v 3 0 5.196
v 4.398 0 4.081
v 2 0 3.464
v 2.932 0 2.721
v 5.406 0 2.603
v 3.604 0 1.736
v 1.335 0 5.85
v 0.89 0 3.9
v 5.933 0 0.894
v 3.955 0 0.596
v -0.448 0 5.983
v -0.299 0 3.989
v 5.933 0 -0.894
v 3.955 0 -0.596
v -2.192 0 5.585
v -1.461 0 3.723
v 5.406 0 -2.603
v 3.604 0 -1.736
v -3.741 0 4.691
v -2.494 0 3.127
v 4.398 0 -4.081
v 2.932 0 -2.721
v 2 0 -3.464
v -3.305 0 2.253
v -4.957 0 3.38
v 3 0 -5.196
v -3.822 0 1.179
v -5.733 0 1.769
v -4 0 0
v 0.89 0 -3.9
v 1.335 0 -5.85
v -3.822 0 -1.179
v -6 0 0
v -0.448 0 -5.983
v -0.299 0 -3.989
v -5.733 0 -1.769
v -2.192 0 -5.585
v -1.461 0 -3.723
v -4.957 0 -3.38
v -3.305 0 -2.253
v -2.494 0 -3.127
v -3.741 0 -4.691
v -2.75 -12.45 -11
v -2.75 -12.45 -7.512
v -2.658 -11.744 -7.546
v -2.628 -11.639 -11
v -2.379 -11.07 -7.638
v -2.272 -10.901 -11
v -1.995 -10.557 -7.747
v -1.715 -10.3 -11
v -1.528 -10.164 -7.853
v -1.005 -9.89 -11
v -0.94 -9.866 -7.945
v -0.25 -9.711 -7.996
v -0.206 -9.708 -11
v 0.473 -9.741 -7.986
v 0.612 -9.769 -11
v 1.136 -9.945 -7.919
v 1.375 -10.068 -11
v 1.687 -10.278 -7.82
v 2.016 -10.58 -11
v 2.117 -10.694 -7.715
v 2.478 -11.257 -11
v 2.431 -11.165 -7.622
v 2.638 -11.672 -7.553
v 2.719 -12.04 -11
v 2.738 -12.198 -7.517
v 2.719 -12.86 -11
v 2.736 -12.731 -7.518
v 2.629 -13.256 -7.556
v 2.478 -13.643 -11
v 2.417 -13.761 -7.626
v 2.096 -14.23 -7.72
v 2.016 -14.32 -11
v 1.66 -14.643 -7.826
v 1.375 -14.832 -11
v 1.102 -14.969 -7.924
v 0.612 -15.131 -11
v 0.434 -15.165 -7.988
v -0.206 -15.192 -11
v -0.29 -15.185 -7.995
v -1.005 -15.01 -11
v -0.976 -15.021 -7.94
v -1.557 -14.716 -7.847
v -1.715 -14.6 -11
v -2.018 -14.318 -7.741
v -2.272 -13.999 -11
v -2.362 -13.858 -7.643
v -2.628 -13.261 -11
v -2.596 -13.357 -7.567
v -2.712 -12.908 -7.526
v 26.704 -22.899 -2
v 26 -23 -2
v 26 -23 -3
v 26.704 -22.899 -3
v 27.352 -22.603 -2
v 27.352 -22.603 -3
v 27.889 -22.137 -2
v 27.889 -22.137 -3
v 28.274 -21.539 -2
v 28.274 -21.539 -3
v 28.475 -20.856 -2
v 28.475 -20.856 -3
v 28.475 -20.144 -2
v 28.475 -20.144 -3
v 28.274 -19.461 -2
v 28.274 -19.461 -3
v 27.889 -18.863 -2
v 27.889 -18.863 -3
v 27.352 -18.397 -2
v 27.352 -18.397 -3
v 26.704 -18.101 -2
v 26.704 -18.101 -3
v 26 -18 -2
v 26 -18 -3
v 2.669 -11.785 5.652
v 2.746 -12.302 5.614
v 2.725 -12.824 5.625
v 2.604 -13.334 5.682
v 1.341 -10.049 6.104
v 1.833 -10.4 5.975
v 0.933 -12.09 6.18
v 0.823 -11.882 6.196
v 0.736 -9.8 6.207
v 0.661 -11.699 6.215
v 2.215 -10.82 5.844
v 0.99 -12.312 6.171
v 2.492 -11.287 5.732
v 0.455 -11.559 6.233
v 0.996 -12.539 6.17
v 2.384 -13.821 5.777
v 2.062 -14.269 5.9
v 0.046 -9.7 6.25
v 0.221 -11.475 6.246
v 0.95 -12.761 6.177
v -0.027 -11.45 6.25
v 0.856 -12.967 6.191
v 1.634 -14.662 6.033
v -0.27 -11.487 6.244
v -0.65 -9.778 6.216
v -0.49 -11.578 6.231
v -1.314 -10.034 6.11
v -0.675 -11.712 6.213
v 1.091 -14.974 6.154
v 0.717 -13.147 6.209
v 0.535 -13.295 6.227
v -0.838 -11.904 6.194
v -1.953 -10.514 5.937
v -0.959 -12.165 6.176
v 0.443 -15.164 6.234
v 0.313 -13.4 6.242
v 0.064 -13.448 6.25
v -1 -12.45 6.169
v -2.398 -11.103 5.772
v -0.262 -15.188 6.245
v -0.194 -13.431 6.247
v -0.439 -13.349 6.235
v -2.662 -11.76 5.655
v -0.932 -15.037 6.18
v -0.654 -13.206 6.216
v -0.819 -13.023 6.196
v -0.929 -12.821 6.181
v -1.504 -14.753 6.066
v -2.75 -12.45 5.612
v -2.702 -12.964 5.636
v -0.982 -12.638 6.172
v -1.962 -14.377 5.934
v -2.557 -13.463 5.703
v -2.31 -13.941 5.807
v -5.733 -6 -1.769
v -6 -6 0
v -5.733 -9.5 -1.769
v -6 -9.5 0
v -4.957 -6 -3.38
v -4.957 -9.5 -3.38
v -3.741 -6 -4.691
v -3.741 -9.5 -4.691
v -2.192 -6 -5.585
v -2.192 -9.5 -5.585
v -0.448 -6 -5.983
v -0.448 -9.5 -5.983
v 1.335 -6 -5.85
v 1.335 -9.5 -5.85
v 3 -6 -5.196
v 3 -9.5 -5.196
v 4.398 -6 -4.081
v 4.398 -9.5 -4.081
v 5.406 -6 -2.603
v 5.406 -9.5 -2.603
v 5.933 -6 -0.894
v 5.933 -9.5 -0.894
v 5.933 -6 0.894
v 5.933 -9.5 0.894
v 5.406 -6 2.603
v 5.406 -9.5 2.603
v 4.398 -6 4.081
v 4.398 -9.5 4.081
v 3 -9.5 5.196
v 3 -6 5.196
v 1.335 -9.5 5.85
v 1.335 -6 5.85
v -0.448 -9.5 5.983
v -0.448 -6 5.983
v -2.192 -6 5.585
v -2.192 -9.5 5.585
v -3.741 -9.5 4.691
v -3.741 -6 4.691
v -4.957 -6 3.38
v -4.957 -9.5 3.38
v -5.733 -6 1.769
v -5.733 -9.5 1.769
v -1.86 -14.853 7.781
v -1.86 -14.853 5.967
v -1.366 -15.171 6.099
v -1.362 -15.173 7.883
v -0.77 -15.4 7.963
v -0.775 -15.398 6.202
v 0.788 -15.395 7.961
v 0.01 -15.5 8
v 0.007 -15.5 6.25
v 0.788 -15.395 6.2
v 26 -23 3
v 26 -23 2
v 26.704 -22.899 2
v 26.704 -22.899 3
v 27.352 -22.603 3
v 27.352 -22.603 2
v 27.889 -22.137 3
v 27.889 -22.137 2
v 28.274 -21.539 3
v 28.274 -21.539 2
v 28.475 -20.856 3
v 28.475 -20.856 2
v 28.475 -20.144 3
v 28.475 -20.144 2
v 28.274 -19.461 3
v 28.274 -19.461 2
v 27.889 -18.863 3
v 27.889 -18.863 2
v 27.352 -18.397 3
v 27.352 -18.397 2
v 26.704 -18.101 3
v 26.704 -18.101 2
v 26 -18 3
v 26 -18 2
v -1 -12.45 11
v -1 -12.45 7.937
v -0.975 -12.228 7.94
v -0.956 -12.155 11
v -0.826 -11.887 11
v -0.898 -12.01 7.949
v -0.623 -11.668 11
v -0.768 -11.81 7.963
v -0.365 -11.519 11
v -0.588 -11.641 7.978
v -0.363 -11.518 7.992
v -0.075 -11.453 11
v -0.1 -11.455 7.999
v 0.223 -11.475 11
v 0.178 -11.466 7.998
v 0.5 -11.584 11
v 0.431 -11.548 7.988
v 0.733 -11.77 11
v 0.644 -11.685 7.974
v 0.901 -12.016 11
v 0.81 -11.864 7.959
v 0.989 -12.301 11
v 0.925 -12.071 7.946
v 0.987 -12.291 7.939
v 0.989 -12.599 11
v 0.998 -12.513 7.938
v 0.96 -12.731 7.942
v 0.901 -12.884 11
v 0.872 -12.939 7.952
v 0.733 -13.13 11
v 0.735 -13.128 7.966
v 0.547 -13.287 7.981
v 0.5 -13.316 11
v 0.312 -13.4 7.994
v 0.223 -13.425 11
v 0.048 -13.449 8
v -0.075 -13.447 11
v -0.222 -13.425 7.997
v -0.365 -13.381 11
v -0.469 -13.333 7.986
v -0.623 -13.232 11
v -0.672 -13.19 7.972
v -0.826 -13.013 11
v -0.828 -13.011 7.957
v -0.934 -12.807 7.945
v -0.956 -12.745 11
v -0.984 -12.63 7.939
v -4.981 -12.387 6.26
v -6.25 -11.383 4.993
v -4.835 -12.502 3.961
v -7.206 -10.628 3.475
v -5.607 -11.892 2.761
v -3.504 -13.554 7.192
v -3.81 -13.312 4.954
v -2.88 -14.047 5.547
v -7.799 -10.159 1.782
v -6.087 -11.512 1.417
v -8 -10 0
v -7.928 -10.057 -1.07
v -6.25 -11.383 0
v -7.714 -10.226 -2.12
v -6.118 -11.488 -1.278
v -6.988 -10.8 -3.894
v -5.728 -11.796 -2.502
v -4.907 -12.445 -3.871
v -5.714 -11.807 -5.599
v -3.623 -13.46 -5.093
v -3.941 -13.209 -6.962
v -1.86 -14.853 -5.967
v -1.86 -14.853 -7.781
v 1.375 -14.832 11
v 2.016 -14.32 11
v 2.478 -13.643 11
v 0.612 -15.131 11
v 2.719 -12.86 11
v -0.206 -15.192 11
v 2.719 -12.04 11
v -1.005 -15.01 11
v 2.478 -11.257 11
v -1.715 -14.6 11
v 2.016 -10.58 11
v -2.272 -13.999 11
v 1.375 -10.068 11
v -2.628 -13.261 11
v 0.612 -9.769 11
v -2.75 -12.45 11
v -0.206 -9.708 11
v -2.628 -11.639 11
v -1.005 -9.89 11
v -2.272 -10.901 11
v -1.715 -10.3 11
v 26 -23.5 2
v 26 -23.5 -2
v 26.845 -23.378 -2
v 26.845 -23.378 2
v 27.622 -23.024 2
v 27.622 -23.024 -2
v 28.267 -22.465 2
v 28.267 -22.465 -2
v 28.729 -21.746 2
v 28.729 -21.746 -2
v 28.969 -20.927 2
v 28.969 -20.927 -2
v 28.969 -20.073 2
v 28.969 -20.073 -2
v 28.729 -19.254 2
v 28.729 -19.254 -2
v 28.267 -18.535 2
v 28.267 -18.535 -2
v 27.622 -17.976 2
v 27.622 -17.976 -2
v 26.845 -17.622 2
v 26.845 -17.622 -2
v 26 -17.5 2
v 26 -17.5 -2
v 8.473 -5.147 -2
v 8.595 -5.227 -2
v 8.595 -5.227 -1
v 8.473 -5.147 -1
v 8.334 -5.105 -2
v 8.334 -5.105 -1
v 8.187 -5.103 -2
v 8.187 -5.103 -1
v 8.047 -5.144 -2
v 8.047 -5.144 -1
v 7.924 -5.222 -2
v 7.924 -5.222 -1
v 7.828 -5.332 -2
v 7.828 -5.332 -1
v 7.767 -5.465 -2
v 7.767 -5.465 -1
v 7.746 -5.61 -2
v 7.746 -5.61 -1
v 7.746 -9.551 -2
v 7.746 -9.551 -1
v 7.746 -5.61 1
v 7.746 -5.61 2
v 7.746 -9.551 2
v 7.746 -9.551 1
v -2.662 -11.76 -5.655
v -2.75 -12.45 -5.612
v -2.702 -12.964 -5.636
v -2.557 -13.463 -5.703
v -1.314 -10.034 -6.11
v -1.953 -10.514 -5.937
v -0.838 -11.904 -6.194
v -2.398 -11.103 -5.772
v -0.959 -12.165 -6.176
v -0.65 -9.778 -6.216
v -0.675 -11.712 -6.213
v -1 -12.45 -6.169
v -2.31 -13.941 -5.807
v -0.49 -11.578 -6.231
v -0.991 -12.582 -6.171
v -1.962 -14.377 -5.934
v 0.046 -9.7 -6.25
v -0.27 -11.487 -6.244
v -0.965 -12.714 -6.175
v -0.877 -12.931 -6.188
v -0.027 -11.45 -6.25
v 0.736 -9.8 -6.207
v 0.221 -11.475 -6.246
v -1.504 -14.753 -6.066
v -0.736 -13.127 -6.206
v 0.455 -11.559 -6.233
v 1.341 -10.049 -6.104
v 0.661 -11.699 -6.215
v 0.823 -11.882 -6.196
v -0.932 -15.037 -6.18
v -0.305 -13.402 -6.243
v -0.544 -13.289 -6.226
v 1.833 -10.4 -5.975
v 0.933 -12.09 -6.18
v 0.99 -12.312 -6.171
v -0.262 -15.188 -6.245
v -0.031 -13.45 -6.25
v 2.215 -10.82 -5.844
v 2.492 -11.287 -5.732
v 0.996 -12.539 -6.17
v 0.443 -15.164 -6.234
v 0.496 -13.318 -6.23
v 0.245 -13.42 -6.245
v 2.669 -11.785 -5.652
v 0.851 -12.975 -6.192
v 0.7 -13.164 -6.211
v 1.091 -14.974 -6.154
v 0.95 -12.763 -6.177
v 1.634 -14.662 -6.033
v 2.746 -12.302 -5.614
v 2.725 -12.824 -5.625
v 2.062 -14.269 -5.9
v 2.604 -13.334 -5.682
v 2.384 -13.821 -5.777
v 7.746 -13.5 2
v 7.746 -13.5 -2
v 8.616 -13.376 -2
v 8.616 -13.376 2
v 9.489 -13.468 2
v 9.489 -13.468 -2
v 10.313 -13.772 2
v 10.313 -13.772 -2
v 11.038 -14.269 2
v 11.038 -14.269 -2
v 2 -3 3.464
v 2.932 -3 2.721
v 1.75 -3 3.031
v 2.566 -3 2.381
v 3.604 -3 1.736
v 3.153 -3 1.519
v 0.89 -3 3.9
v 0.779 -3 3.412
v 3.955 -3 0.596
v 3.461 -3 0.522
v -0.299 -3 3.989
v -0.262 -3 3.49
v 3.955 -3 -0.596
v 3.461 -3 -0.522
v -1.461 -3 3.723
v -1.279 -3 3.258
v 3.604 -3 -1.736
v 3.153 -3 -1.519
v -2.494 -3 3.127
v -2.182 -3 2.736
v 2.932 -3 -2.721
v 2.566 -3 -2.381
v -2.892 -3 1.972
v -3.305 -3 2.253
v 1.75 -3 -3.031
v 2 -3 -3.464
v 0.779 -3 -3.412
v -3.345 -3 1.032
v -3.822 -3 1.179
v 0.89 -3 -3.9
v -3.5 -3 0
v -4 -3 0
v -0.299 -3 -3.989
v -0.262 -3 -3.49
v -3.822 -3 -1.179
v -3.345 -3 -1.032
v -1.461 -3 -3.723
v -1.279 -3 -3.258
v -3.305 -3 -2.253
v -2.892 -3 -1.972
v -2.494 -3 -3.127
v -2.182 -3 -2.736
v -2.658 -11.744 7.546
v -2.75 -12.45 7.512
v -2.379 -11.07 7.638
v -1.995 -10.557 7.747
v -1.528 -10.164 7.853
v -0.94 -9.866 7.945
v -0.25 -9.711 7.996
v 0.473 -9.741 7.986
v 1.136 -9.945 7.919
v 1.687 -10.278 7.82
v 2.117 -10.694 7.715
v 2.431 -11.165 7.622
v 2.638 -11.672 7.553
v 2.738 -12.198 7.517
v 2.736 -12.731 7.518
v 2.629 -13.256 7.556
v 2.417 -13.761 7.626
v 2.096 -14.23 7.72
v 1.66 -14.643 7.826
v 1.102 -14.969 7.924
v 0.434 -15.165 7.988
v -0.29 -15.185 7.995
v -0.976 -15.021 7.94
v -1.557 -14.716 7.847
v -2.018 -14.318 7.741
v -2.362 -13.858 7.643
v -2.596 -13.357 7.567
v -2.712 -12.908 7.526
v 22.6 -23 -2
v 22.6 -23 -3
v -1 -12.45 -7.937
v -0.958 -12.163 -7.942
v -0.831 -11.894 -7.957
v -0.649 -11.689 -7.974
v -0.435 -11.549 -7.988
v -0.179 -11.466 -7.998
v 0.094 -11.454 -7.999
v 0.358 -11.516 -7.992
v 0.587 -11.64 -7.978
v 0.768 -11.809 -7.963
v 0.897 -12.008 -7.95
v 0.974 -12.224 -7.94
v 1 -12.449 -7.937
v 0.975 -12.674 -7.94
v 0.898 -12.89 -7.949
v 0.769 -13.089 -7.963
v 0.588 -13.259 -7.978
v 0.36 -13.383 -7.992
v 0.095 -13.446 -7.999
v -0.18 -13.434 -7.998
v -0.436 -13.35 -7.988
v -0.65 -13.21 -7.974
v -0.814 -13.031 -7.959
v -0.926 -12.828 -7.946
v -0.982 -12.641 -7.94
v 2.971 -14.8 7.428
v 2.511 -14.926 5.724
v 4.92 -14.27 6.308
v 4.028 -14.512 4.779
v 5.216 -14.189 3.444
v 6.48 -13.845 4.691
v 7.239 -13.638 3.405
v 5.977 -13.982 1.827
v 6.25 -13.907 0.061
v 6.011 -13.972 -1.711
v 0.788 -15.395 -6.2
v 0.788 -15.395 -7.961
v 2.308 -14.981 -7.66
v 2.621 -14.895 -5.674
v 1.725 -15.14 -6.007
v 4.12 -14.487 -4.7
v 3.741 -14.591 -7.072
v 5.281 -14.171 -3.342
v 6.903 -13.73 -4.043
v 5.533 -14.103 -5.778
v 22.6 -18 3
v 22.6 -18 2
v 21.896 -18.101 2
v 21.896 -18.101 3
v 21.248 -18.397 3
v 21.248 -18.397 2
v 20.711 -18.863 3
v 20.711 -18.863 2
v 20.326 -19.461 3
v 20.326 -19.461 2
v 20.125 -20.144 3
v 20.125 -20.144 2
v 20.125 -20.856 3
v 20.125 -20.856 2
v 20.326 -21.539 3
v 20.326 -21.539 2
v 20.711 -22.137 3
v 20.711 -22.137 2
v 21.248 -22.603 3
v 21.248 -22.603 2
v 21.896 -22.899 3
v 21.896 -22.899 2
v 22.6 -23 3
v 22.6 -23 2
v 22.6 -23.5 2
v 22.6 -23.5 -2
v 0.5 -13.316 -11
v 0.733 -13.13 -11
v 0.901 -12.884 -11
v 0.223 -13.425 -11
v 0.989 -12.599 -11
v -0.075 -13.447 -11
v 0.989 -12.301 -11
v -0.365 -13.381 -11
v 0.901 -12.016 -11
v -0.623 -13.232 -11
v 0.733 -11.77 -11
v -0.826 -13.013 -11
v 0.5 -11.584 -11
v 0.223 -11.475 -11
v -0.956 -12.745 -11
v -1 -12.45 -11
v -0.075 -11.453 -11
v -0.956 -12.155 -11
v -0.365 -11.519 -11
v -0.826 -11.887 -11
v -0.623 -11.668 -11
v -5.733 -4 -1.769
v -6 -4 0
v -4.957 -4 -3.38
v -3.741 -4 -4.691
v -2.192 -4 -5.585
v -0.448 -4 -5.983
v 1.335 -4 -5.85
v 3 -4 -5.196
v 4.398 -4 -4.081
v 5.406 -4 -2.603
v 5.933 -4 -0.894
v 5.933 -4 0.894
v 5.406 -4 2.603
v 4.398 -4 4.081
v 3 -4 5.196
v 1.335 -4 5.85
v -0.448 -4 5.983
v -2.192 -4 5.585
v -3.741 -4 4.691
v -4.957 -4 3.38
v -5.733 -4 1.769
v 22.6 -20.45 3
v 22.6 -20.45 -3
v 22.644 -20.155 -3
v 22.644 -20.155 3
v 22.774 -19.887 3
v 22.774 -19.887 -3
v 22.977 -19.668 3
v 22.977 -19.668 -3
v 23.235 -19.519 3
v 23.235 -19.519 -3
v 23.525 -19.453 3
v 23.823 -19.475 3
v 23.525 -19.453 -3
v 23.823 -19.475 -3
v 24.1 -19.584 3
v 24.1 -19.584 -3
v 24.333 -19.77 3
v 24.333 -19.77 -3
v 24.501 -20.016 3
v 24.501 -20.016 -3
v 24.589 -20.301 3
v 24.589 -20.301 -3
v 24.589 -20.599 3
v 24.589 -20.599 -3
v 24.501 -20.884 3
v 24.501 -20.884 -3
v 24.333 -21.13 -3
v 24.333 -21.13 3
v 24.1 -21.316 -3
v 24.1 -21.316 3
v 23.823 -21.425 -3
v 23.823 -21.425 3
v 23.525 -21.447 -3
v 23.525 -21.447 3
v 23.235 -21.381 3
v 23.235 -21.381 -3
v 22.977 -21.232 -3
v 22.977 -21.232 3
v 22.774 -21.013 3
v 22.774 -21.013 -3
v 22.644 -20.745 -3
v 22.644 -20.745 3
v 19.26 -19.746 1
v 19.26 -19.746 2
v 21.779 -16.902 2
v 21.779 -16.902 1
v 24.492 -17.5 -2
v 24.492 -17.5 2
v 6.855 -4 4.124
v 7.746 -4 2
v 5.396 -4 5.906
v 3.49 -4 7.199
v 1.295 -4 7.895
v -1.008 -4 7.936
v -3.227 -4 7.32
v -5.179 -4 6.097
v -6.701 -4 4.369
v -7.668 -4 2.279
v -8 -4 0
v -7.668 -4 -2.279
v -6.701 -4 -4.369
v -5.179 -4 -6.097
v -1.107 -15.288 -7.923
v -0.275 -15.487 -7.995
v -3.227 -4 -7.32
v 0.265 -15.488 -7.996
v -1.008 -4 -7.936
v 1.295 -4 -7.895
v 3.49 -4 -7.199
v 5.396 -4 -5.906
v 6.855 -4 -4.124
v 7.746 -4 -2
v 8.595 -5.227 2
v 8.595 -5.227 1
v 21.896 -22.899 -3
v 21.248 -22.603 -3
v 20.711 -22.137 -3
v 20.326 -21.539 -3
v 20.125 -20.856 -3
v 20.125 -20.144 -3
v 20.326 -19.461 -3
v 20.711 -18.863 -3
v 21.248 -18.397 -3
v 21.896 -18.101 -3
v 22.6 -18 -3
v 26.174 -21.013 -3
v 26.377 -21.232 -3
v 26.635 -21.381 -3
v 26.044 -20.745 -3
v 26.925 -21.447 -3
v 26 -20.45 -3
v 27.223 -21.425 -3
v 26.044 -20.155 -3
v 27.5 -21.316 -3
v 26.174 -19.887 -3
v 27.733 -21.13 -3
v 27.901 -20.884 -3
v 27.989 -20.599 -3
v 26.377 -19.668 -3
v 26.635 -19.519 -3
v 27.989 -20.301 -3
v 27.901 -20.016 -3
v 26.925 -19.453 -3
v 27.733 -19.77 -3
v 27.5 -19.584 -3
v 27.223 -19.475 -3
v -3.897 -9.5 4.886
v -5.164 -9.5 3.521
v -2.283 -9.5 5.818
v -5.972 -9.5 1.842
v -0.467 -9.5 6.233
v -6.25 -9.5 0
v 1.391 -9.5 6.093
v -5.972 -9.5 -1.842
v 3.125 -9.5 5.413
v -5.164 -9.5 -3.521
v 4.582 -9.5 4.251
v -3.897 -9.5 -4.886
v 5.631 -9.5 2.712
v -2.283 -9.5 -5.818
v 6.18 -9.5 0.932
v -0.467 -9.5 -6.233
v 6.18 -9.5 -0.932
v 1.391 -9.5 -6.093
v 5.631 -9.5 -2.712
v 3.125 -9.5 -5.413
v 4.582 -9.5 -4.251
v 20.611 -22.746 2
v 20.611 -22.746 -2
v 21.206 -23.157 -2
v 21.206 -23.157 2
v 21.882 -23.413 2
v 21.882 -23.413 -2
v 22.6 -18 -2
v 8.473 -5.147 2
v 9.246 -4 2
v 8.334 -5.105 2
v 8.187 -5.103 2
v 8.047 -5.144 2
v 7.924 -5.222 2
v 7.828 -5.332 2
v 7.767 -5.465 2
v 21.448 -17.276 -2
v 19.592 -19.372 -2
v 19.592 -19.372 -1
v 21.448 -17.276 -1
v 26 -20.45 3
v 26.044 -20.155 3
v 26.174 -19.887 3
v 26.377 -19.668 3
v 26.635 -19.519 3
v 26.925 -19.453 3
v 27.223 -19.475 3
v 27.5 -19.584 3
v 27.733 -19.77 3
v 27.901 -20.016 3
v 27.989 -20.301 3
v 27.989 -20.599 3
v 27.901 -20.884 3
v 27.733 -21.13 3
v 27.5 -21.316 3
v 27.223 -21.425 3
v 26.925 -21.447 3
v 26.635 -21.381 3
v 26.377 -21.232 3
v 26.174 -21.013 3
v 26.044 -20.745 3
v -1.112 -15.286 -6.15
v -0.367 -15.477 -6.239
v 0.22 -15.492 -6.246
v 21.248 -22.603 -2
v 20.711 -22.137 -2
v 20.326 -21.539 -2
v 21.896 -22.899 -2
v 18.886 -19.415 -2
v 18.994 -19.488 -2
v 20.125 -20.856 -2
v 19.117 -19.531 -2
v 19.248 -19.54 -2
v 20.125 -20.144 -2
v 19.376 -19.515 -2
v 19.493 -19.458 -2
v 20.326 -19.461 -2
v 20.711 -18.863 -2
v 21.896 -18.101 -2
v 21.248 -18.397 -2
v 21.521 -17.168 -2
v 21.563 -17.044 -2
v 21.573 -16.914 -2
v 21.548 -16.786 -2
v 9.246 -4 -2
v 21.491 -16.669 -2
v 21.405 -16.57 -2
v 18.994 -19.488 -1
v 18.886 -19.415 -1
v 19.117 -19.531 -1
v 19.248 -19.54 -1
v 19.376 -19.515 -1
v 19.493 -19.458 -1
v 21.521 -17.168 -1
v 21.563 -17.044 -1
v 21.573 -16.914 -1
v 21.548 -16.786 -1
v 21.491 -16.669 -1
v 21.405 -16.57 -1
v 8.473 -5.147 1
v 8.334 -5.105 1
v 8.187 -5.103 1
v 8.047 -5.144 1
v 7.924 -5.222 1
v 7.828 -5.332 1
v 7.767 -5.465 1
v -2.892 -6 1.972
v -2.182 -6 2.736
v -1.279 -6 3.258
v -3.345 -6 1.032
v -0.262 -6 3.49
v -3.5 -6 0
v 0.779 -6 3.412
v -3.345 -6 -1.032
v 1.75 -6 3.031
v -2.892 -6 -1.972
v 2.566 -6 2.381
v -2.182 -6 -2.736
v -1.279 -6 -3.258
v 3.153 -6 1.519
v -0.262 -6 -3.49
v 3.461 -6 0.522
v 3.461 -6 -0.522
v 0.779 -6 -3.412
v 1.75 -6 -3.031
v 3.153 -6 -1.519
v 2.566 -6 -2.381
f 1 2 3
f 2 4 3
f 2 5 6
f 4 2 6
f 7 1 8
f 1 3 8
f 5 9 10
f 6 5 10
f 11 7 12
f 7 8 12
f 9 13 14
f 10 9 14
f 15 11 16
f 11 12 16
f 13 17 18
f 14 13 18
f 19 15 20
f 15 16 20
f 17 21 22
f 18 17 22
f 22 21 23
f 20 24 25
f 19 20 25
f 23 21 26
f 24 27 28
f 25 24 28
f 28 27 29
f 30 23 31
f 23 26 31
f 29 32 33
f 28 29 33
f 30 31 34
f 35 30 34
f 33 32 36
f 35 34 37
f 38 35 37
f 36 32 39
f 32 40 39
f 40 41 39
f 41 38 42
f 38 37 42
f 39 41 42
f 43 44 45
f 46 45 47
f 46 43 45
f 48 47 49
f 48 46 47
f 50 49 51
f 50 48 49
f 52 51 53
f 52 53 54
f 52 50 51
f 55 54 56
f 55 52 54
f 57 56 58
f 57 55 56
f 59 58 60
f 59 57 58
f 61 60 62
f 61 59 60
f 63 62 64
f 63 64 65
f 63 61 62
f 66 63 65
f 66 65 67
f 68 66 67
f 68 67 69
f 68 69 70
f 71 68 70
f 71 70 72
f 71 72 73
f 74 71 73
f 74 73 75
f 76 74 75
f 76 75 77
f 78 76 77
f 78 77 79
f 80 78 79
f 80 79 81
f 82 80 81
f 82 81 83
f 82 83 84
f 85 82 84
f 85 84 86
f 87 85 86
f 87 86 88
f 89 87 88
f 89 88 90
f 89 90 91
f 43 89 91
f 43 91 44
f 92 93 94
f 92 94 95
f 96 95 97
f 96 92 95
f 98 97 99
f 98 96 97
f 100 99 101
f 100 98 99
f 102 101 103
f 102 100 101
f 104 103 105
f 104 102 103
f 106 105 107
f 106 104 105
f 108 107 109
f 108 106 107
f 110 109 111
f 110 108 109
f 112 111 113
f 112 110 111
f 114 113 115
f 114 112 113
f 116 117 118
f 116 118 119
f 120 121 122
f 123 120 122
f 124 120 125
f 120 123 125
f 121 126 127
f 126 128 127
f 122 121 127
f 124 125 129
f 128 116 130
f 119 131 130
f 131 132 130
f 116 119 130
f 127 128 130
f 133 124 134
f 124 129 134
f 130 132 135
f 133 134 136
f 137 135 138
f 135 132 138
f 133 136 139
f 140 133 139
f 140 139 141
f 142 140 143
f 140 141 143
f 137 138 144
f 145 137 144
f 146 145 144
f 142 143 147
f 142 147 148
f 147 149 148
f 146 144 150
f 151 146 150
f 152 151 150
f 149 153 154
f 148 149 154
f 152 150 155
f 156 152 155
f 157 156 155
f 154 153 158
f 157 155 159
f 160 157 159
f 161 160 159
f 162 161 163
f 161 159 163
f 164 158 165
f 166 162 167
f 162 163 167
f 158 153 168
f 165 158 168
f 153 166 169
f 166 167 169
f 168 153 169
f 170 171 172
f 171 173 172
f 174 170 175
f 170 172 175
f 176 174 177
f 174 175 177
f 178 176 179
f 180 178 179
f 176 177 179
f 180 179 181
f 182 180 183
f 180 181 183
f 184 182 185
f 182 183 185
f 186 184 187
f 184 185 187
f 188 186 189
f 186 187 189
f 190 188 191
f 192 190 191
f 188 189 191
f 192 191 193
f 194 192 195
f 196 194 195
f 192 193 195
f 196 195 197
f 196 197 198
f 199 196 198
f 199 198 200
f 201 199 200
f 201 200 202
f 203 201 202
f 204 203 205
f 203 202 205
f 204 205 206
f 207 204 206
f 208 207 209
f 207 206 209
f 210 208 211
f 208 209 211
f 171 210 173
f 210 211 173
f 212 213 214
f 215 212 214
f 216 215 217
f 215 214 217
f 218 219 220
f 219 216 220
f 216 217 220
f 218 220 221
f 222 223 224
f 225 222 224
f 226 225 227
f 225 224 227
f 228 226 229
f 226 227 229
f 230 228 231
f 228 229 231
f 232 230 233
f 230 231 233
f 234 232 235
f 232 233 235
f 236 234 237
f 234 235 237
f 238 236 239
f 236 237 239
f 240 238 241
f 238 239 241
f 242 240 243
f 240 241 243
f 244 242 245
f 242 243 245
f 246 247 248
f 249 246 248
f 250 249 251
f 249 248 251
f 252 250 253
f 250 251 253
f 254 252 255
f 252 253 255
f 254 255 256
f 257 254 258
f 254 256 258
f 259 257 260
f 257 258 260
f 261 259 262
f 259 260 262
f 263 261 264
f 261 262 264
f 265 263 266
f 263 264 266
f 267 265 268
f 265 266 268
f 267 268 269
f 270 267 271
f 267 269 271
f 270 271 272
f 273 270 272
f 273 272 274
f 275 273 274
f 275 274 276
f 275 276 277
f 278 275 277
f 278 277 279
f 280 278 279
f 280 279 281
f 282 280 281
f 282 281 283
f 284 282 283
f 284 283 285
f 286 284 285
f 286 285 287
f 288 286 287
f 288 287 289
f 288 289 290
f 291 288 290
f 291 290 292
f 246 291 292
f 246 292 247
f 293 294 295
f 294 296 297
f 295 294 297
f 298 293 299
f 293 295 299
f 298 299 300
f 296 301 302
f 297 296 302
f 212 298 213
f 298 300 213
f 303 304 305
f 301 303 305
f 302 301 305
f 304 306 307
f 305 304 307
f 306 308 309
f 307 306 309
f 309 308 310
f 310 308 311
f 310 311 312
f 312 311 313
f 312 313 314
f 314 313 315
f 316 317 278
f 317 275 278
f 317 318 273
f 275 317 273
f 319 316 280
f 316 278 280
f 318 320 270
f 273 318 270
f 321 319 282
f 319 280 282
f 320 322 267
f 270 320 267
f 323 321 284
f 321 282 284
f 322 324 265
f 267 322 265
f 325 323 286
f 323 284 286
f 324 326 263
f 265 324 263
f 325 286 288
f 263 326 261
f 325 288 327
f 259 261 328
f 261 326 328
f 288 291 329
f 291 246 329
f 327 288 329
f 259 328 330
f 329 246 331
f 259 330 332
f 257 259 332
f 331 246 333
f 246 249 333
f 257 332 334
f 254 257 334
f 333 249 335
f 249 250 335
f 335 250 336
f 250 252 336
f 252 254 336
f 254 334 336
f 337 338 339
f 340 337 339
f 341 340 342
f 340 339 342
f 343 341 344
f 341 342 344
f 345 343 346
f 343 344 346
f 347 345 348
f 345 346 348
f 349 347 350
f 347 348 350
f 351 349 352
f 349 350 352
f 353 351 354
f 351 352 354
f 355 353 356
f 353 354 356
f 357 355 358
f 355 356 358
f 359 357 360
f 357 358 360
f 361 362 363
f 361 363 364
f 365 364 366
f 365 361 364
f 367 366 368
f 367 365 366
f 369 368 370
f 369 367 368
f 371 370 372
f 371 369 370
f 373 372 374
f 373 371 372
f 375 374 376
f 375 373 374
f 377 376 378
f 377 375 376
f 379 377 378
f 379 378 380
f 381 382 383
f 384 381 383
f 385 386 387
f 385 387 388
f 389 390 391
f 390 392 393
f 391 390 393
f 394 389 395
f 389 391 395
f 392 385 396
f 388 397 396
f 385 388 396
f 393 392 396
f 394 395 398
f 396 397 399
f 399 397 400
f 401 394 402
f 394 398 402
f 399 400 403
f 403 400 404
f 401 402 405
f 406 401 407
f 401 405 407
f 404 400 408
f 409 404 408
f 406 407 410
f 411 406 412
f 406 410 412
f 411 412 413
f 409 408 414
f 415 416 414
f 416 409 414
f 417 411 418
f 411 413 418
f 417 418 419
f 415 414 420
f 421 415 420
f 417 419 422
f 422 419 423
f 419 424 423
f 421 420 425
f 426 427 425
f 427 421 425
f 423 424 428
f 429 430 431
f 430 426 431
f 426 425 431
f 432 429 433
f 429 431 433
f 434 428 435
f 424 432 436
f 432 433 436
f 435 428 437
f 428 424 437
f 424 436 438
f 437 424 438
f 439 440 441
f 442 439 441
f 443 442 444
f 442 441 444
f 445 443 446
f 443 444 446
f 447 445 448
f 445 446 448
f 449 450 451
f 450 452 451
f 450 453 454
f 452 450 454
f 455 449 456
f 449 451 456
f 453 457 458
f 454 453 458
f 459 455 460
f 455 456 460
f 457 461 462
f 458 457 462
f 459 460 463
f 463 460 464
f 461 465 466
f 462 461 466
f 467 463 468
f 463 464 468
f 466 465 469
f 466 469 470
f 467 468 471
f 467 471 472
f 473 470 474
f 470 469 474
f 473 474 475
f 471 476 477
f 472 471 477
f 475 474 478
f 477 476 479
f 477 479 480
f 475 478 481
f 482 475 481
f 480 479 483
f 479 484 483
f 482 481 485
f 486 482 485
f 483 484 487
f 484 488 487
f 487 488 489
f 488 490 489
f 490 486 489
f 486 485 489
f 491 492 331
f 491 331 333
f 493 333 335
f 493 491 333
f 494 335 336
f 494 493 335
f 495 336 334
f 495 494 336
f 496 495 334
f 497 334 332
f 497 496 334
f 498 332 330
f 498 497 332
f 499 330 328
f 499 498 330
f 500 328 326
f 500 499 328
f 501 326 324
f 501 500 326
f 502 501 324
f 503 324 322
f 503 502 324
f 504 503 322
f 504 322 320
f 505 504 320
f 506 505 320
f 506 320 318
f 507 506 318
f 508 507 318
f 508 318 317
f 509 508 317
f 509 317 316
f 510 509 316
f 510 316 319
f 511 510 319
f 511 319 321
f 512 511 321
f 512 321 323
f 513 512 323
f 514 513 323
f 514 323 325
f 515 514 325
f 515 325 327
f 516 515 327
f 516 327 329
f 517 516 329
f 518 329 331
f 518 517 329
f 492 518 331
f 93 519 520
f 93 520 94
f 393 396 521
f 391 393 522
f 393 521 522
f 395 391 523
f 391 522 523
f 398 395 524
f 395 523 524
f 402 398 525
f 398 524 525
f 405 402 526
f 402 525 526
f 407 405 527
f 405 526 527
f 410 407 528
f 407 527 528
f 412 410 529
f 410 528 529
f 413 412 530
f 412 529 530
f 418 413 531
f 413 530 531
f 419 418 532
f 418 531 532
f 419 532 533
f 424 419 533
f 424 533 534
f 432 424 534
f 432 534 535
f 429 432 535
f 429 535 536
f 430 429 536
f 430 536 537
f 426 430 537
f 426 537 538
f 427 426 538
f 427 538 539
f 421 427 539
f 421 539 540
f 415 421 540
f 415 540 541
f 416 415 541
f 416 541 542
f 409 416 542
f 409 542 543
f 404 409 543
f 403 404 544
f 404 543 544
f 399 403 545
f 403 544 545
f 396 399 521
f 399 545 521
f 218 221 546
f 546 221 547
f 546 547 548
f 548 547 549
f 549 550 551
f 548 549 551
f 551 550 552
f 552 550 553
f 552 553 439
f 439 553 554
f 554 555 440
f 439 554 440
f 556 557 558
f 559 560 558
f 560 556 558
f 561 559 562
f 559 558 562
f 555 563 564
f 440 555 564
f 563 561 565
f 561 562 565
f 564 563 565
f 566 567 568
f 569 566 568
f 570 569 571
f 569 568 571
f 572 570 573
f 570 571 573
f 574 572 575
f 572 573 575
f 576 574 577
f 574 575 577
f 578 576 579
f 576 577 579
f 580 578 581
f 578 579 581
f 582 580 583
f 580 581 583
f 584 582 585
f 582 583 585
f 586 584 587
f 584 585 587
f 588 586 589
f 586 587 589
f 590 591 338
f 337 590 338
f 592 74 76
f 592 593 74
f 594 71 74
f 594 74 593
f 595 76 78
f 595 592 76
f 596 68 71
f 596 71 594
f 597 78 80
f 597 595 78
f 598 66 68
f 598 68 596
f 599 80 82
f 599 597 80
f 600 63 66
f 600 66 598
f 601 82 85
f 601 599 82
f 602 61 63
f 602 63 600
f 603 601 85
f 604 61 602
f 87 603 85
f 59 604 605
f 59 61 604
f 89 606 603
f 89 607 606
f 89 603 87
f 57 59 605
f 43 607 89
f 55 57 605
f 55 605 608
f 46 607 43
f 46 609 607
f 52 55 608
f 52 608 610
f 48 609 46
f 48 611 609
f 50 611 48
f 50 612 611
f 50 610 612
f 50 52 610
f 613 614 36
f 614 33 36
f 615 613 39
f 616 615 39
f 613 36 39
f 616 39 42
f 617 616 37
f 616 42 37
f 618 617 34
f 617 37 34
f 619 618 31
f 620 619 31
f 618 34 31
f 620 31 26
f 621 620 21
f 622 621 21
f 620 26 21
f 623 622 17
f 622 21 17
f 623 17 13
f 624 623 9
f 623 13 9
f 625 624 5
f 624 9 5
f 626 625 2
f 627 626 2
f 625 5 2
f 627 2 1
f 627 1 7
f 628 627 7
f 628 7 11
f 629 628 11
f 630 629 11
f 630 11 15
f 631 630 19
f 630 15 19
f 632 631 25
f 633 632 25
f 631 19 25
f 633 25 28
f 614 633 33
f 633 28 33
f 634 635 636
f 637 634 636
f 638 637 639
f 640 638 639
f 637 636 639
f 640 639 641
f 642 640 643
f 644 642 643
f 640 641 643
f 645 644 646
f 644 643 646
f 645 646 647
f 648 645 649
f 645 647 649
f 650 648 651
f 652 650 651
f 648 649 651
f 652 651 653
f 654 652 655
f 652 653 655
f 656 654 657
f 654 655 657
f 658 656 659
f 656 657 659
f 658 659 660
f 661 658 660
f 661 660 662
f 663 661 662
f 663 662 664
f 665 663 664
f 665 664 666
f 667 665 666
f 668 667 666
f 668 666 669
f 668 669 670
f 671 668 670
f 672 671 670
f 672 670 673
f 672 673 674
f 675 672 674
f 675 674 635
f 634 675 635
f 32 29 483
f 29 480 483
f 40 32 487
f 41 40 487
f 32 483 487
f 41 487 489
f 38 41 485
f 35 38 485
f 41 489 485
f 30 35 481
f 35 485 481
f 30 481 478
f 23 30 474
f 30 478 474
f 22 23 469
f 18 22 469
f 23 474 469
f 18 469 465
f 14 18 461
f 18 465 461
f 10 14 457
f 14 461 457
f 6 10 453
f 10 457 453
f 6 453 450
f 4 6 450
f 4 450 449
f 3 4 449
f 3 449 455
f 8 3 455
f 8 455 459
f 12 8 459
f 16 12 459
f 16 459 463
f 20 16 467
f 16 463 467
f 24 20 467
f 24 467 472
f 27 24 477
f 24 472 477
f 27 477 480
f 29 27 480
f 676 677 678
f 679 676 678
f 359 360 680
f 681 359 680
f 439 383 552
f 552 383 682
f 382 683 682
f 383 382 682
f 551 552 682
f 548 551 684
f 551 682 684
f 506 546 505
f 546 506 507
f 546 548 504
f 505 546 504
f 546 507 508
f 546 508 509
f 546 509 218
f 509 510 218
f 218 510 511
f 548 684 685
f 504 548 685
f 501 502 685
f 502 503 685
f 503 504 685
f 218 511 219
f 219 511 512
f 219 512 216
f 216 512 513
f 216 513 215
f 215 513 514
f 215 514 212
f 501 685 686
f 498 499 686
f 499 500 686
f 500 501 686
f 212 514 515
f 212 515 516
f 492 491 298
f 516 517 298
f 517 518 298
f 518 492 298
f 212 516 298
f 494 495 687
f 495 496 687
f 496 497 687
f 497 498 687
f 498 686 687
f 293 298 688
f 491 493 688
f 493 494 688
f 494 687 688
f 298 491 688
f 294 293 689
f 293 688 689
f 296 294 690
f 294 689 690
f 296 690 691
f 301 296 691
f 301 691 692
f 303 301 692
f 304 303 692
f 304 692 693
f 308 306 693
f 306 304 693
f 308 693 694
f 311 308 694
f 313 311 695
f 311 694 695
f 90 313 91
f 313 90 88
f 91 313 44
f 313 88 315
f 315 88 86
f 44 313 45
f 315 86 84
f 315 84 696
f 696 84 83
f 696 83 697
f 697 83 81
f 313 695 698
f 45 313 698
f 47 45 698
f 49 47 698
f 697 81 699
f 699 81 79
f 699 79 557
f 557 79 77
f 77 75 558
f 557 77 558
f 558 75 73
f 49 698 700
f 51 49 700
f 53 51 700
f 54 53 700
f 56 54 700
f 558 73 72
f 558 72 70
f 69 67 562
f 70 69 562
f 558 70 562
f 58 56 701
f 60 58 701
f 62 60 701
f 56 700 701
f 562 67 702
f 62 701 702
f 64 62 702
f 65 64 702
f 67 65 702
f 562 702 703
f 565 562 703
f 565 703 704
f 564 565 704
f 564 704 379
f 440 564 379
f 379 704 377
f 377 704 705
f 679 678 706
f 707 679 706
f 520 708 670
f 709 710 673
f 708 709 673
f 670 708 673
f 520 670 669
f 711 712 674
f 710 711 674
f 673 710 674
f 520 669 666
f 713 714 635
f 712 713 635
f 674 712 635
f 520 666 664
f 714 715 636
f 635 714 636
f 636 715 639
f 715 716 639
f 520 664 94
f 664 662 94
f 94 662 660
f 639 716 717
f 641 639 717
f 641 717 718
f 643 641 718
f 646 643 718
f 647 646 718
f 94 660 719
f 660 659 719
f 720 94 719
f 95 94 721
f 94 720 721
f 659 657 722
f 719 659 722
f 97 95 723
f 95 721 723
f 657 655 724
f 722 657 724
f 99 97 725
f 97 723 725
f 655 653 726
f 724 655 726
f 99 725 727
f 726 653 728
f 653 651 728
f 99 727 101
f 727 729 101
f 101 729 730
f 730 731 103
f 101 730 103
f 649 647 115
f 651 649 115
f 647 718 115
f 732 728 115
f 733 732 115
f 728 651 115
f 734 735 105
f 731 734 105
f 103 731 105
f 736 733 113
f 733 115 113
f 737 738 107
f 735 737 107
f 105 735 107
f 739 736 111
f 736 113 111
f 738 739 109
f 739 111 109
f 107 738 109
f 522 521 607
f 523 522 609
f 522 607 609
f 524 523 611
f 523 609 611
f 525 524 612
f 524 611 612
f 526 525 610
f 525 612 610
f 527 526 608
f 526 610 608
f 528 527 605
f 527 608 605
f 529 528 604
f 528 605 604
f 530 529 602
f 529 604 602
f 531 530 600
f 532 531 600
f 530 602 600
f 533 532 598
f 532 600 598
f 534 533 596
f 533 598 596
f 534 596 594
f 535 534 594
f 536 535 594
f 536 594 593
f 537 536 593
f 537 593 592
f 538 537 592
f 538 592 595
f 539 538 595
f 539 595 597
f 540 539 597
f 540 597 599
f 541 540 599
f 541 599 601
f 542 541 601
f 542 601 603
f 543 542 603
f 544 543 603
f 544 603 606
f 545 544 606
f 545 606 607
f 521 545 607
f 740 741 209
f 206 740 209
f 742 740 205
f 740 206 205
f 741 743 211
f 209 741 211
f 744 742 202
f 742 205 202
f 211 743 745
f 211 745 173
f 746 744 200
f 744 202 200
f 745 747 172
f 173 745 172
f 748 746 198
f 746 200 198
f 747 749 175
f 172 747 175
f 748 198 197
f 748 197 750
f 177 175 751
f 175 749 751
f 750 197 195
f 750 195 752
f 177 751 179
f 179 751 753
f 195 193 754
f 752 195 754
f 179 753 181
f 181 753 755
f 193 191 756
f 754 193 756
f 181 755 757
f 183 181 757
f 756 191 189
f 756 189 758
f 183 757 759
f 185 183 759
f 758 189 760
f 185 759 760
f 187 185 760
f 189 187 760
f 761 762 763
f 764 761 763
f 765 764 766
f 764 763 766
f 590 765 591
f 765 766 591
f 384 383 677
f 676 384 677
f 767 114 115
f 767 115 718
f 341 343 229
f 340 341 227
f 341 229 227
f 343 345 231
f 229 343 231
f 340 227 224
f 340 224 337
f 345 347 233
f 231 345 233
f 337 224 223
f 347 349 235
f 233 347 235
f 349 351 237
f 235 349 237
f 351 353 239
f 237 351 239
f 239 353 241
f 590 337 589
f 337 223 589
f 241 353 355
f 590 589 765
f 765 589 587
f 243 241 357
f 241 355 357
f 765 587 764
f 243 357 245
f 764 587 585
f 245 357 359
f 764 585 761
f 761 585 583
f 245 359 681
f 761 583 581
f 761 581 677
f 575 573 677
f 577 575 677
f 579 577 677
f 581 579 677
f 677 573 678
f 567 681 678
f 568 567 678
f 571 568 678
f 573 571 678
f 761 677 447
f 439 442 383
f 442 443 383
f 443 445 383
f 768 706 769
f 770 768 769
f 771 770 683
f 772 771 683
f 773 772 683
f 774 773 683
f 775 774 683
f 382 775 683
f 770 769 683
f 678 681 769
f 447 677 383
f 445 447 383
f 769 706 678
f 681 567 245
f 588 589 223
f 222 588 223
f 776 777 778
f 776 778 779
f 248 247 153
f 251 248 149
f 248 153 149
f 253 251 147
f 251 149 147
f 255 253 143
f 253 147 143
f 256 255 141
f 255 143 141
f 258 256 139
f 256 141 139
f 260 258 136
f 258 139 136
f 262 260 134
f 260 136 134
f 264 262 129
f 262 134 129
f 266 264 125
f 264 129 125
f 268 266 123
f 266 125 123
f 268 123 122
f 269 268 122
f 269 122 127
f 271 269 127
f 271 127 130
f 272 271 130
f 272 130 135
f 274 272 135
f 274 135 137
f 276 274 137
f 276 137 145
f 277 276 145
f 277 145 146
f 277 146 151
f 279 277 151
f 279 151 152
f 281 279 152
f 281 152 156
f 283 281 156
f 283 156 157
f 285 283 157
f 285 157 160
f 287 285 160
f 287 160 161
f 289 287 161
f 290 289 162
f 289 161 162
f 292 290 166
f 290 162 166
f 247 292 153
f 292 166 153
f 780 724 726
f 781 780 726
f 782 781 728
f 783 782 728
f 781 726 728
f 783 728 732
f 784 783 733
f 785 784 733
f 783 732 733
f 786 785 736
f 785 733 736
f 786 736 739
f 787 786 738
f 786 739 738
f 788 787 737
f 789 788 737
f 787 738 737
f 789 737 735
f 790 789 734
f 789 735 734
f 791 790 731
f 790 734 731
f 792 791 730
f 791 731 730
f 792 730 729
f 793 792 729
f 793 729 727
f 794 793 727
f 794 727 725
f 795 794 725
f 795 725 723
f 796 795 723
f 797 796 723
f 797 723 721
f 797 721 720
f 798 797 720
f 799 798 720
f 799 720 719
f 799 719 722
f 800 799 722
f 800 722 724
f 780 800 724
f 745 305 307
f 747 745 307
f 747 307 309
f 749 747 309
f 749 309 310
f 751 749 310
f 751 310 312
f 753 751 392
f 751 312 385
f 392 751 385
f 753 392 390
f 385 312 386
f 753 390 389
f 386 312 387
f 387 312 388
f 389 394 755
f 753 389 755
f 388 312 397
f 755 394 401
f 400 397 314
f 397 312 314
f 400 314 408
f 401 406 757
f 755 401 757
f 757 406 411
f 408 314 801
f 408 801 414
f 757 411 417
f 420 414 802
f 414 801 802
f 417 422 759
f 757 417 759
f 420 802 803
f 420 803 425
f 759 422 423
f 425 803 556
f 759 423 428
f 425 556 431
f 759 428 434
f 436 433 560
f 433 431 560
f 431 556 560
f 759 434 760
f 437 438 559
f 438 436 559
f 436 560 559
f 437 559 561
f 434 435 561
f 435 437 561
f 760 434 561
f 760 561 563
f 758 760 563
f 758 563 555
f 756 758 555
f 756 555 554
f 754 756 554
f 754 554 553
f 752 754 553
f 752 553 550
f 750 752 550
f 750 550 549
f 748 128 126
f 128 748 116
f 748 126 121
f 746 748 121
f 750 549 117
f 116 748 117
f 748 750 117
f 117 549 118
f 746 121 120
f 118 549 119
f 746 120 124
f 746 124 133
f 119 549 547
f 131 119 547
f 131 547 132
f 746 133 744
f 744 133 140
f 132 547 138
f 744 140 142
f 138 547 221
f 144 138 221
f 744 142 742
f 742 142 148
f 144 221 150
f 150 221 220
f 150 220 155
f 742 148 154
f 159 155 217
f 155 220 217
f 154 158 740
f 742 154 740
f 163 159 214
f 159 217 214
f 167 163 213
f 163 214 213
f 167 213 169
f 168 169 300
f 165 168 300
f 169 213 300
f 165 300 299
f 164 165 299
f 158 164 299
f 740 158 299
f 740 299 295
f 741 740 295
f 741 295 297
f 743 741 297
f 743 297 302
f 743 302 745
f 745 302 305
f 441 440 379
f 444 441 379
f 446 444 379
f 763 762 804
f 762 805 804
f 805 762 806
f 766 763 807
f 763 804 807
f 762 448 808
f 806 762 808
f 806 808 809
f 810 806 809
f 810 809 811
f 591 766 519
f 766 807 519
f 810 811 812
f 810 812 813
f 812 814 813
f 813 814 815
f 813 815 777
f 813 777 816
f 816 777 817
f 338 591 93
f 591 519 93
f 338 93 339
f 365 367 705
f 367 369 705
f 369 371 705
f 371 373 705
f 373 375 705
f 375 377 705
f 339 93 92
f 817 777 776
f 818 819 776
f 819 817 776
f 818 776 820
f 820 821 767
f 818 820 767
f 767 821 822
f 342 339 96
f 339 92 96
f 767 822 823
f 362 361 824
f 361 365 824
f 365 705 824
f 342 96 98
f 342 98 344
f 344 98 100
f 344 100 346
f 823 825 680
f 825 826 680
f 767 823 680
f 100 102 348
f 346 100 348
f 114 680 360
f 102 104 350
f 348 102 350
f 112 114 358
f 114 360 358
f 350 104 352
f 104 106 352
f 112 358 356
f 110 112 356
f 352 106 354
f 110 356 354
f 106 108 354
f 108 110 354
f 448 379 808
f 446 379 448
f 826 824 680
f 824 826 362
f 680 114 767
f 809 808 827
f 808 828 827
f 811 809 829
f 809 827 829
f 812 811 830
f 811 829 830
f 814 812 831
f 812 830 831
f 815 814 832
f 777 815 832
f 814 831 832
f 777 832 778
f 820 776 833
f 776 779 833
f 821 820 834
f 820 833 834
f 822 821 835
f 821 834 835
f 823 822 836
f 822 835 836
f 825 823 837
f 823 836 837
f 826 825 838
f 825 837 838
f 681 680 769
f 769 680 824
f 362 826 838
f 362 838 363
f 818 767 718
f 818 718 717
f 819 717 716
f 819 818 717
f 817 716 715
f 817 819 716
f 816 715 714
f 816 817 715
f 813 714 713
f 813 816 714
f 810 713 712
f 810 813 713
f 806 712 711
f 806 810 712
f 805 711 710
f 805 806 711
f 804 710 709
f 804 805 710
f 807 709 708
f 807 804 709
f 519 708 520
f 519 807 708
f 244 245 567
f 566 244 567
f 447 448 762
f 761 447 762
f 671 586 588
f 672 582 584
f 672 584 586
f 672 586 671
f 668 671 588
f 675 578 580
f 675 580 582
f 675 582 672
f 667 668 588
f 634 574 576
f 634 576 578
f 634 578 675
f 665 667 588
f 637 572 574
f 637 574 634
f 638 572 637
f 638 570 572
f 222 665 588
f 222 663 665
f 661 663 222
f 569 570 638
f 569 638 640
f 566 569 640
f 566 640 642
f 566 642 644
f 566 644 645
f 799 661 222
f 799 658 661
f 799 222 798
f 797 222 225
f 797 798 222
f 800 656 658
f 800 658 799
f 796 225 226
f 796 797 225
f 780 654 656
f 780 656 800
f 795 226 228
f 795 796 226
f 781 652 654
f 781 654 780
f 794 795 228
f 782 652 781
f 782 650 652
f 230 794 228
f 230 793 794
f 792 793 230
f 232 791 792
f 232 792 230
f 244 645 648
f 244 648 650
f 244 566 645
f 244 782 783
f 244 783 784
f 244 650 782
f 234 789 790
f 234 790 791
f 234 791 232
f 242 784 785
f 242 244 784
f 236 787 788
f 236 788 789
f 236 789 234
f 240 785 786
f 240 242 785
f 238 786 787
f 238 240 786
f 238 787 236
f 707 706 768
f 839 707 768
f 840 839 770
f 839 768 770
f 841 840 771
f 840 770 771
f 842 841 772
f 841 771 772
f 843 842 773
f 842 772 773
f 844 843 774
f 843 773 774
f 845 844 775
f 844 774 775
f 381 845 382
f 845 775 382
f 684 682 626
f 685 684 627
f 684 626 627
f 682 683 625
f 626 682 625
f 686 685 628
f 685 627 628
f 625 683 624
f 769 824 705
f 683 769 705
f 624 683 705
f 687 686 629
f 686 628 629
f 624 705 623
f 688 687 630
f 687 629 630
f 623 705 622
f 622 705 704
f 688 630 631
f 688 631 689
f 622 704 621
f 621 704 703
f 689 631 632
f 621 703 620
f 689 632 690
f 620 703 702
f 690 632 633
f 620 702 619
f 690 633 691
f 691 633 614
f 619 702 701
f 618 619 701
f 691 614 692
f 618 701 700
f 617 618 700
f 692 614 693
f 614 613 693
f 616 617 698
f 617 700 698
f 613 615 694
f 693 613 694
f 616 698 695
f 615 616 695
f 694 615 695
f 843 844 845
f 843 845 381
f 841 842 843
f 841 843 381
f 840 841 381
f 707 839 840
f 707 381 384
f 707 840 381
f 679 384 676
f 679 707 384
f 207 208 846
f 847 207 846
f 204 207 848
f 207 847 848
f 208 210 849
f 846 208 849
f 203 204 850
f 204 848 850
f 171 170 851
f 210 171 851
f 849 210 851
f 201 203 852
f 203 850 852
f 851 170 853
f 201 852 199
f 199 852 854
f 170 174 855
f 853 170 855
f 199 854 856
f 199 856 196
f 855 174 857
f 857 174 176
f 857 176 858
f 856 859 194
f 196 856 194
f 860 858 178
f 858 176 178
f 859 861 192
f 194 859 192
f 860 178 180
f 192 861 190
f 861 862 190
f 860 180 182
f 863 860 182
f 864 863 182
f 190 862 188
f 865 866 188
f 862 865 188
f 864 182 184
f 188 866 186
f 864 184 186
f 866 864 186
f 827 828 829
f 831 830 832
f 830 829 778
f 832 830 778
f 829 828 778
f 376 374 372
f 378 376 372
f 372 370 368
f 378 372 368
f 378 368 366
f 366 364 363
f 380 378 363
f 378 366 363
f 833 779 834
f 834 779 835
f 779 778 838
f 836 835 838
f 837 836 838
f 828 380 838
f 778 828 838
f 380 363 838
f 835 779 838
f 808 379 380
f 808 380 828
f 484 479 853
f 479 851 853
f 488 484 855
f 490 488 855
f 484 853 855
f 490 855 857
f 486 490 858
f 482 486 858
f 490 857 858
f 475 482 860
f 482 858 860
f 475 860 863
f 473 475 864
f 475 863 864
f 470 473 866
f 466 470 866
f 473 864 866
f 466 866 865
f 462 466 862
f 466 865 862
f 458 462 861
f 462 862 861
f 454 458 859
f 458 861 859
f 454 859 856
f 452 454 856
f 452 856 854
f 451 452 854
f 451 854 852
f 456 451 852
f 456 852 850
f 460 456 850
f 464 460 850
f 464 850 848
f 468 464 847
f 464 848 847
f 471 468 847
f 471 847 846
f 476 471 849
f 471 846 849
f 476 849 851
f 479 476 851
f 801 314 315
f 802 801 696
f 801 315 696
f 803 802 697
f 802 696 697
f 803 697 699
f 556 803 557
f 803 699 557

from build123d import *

# Parameters (mm, degrees)
EXTRUDE_1_DEPTH     = 29
CUT_EXTRUDE_1_DEPTH = 29
CUT_EXTRUDE_2_DEPTH = 1
FILLET_1_R          = 0.5
EXTRUDE_2_DEPTH     = 1
SKETCH_7_R          = 2.75
SKETCH_7_R_2        = 1
EXTRUDE_5_DEPTH     = 22
CUT_EXTRUDE_START   = 19
SKETCH_8_R          = 6.25
CUT_EXTRUDE_4_DEPTH = 19
SKETCH_9_R          = 1
CUT_EXTRUDE_5_DEPTH = 18
SKETCH_10_R         = 1
CUT_EXTRUDE_6_DEPTH = 26


with BuildPart() as part:
    # 草图1 → 旋转1 (revolve)
    with BuildSketch(Plane.XY, mode=Mode.PRIVATE) as revolve_1_sk:
        Polygon((4, 0), (4, -3), (3.5, -3), (3.5, -6), (6, -6), (6, -9.5), (6.25, -9.5), (6.25, -16), (8, -16), (8, -4), (6, -4), (6, 0), align=None)
    revolve(revolve_1_sk.sketch.rotate(Axis((0, 0, 0), (0, -1, 0)), 180), axis=Axis((0, 0, 0), (0, -1, 0)))

    # 草图2 → 凸台-拉伸1 (add)
    with BuildSketch(Plane(origin=(0, -4, 0), x_dir=(1, 0, 0), z_dir=(0, 1, 0))):
        with BuildLine():
            Line((7.745966692, 2), (32, 2))
            Line((32, 2), (32, -2))
            Line((32, -2), (7.745966692, -2))
            ThreePointArc((7.745966692, -2), (8, 0), (7.745966692, 2))
        make_face()
    extrude(amount=-EXTRUDE_1_DEPTH)

    # 草图3 → 切除-拉伸1 (cut)
    with BuildSketch(Plane(origin=(0, 0, -12), x_dir=(-1, 0, 0), z_dir=(0, 0, -1))):
        with BuildLine():
            Line((8, -10), (1.860452447, -14.853447831))
            ThreePointArc((1.860452447, -14.853447831), (0.600535009, -15.439278432), (-0.788203157, -15.394604599))
            Line((-0.788203157, -15.394604599), (-7.745966692, -13.5))
            ThreePointArc((-7.745966692, -13.5), (-9.489135576, -13.468262993), (-11.037904709, -14.26886225))
            Line((-11.037904709, -14.26886225), (-20.611161345, -22.746001069))
            ThreePointArc((-20.611161345, -22.746001069), (-21.536515916, -23.305174077), (-22.6, -23.5))
            Line((-22.6, -23.5), (-26, -23.5))
            ThreePointArc((-26, -23.5), (-29, -20.5), (-26, -17.5))
            Line((-26, -17.5), (-24.491554542, -17.5))
            Line((-24.491554542, -17.5), (-9.245966692, -4))
            Line((-9.245966692, -4), (-32, -4))
            Line((-32, -4), (-32, -33))
            Line((-32, -33), (-7.745966692, -33))
            Line((-7.745966692, -33), (-7.745966692, -16))
            Line((-7.745966692, -16), (8, -16))
            Line((8, -16), (8, -10))
        make_face()
    extrude(amount=-CUT_EXTRUDE_1_DEPTH, mode=Mode.SUBTRACT)

    # 草图4 → 切除-拉伸2 (cut)
    with BuildSketch(Plane(origin=(0, 0, -2), x_dir=(-1, 0, 0), z_dir=(0, 0, -1))):
        with BuildLine():
            Line((-19.26013767, -19.746461933), (-21.7793333, -16.901527245))
            Line((-21.7793333, -16.901527245), (-8.595436654, -5.227159128))
            ThreePointArc((-8.595436654, -5.227159128), (-8.047086067, -5.143800877), (-7.745966692, -5.609594916))
            Line((-7.745966692, -5.609594916), (-7.745966692, -9.550639395))
            Line((-7.745966692, -9.550639395), (-19.26013767, -19.746461933))
        make_face()
    cut_extrude_2 = extrude(amount=-CUT_EXTRUDE_2_DEPTH, mode=Mode.SUBTRACT)

    # 圆角1
    fillet_1_edges = [part.edges().sort_by_distance(p)[0] for p in [
        (19.26013767, -19.746461933, -1.5),
        (21.7793333, -16.901527245, -1.5),
    ]]
    fillet(fillet_1_edges, radius=FILLET_1_R)

    # 草图5 → 凸台-拉伸2 (add)
    with BuildSketch(Plane(origin=(0, 0, -2), x_dir=(-1, 0, 0), z_dir=(0, 0, -1))):
        with BuildLine():
            Line((-22.6, -23), (-26, -23))
            ThreePointArc((-26, -23), (-28.5, -20.5), (-26, -18))
            Line((-26, -18), (-22.6, -18))
            ThreePointArc((-22.6, -18), (-20.1, -20.5), (-22.6, -23))
        make_face()
    extrude_2 = extrude(amount=EXTRUDE_2_DEPTH)

    # 镜向1: 切除-拉伸2, 凸台-拉伸2 across plane
    add(cut_extrude_2.mirror(Plane(origin=(0, 0, 0), x_dir=(1, 0, 0), z_dir=(0, 0, -1))), mode=Mode.SUBTRACT)
    add(extrude_2.mirror(Plane(origin=(0, 0, 0), x_dir=(1, 0, 0), z_dir=(0, 0, -1))))

    # 草图7 → 凸台-拉伸5 (add)
    with BuildSketch(Plane(origin=(0, 0, -11), x_dir=(-1, 0, 0), z_dir=(0, 0, -1))):
        with Locations((0, -12.45)):
            Circle(SKETCH_7_R)
        with Locations((0, -12.45)):
            Circle(SKETCH_7_R_2, mode=Mode.SUBTRACT)
    extrude(amount=-EXTRUDE_5_DEPTH)

    # 草图8 → 切除-拉伸4 (cut)
    with BuildSketch(Plane.XZ.offset(9.5).offset(CUT_EXTRUDE_START)):
        with Locations(Location((0, 0, 0), (0, 0, 180))):
            Circle(SKETCH_8_R)
    extrude(amount=-CUT_EXTRUDE_4_DEPTH, mode=Mode.SUBTRACT)

    # 草图9 → 切除-拉伸5 (cut)
    with BuildSketch(Plane(origin=(0, 0, -3), x_dir=(-1, 0, 0), z_dir=(0, 0, -1))):
        with Locations((-27, -20.45)):
            Circle(SKETCH_9_R)
        with Locations((-23.6, -20.45)):
            Circle(SKETCH_9_R)
    extrude(amount=-CUT_EXTRUDE_5_DEPTH, mode=Mode.SUBTRACT)

    # 草图10 → 切除-拉伸6 (cut)
    with BuildSketch(Plane(origin=(0, 0, -11), x_dir=(-1, 0, 0), z_dir=(0, 0, -1))):
        with Locations((0, -12.45)):
            Circle(SKETCH_10_R)
    extrude(amount=-CUT_EXTRUDE_6_DEPTH, mode=Mode.SUBTRACT)


solid = part.part
